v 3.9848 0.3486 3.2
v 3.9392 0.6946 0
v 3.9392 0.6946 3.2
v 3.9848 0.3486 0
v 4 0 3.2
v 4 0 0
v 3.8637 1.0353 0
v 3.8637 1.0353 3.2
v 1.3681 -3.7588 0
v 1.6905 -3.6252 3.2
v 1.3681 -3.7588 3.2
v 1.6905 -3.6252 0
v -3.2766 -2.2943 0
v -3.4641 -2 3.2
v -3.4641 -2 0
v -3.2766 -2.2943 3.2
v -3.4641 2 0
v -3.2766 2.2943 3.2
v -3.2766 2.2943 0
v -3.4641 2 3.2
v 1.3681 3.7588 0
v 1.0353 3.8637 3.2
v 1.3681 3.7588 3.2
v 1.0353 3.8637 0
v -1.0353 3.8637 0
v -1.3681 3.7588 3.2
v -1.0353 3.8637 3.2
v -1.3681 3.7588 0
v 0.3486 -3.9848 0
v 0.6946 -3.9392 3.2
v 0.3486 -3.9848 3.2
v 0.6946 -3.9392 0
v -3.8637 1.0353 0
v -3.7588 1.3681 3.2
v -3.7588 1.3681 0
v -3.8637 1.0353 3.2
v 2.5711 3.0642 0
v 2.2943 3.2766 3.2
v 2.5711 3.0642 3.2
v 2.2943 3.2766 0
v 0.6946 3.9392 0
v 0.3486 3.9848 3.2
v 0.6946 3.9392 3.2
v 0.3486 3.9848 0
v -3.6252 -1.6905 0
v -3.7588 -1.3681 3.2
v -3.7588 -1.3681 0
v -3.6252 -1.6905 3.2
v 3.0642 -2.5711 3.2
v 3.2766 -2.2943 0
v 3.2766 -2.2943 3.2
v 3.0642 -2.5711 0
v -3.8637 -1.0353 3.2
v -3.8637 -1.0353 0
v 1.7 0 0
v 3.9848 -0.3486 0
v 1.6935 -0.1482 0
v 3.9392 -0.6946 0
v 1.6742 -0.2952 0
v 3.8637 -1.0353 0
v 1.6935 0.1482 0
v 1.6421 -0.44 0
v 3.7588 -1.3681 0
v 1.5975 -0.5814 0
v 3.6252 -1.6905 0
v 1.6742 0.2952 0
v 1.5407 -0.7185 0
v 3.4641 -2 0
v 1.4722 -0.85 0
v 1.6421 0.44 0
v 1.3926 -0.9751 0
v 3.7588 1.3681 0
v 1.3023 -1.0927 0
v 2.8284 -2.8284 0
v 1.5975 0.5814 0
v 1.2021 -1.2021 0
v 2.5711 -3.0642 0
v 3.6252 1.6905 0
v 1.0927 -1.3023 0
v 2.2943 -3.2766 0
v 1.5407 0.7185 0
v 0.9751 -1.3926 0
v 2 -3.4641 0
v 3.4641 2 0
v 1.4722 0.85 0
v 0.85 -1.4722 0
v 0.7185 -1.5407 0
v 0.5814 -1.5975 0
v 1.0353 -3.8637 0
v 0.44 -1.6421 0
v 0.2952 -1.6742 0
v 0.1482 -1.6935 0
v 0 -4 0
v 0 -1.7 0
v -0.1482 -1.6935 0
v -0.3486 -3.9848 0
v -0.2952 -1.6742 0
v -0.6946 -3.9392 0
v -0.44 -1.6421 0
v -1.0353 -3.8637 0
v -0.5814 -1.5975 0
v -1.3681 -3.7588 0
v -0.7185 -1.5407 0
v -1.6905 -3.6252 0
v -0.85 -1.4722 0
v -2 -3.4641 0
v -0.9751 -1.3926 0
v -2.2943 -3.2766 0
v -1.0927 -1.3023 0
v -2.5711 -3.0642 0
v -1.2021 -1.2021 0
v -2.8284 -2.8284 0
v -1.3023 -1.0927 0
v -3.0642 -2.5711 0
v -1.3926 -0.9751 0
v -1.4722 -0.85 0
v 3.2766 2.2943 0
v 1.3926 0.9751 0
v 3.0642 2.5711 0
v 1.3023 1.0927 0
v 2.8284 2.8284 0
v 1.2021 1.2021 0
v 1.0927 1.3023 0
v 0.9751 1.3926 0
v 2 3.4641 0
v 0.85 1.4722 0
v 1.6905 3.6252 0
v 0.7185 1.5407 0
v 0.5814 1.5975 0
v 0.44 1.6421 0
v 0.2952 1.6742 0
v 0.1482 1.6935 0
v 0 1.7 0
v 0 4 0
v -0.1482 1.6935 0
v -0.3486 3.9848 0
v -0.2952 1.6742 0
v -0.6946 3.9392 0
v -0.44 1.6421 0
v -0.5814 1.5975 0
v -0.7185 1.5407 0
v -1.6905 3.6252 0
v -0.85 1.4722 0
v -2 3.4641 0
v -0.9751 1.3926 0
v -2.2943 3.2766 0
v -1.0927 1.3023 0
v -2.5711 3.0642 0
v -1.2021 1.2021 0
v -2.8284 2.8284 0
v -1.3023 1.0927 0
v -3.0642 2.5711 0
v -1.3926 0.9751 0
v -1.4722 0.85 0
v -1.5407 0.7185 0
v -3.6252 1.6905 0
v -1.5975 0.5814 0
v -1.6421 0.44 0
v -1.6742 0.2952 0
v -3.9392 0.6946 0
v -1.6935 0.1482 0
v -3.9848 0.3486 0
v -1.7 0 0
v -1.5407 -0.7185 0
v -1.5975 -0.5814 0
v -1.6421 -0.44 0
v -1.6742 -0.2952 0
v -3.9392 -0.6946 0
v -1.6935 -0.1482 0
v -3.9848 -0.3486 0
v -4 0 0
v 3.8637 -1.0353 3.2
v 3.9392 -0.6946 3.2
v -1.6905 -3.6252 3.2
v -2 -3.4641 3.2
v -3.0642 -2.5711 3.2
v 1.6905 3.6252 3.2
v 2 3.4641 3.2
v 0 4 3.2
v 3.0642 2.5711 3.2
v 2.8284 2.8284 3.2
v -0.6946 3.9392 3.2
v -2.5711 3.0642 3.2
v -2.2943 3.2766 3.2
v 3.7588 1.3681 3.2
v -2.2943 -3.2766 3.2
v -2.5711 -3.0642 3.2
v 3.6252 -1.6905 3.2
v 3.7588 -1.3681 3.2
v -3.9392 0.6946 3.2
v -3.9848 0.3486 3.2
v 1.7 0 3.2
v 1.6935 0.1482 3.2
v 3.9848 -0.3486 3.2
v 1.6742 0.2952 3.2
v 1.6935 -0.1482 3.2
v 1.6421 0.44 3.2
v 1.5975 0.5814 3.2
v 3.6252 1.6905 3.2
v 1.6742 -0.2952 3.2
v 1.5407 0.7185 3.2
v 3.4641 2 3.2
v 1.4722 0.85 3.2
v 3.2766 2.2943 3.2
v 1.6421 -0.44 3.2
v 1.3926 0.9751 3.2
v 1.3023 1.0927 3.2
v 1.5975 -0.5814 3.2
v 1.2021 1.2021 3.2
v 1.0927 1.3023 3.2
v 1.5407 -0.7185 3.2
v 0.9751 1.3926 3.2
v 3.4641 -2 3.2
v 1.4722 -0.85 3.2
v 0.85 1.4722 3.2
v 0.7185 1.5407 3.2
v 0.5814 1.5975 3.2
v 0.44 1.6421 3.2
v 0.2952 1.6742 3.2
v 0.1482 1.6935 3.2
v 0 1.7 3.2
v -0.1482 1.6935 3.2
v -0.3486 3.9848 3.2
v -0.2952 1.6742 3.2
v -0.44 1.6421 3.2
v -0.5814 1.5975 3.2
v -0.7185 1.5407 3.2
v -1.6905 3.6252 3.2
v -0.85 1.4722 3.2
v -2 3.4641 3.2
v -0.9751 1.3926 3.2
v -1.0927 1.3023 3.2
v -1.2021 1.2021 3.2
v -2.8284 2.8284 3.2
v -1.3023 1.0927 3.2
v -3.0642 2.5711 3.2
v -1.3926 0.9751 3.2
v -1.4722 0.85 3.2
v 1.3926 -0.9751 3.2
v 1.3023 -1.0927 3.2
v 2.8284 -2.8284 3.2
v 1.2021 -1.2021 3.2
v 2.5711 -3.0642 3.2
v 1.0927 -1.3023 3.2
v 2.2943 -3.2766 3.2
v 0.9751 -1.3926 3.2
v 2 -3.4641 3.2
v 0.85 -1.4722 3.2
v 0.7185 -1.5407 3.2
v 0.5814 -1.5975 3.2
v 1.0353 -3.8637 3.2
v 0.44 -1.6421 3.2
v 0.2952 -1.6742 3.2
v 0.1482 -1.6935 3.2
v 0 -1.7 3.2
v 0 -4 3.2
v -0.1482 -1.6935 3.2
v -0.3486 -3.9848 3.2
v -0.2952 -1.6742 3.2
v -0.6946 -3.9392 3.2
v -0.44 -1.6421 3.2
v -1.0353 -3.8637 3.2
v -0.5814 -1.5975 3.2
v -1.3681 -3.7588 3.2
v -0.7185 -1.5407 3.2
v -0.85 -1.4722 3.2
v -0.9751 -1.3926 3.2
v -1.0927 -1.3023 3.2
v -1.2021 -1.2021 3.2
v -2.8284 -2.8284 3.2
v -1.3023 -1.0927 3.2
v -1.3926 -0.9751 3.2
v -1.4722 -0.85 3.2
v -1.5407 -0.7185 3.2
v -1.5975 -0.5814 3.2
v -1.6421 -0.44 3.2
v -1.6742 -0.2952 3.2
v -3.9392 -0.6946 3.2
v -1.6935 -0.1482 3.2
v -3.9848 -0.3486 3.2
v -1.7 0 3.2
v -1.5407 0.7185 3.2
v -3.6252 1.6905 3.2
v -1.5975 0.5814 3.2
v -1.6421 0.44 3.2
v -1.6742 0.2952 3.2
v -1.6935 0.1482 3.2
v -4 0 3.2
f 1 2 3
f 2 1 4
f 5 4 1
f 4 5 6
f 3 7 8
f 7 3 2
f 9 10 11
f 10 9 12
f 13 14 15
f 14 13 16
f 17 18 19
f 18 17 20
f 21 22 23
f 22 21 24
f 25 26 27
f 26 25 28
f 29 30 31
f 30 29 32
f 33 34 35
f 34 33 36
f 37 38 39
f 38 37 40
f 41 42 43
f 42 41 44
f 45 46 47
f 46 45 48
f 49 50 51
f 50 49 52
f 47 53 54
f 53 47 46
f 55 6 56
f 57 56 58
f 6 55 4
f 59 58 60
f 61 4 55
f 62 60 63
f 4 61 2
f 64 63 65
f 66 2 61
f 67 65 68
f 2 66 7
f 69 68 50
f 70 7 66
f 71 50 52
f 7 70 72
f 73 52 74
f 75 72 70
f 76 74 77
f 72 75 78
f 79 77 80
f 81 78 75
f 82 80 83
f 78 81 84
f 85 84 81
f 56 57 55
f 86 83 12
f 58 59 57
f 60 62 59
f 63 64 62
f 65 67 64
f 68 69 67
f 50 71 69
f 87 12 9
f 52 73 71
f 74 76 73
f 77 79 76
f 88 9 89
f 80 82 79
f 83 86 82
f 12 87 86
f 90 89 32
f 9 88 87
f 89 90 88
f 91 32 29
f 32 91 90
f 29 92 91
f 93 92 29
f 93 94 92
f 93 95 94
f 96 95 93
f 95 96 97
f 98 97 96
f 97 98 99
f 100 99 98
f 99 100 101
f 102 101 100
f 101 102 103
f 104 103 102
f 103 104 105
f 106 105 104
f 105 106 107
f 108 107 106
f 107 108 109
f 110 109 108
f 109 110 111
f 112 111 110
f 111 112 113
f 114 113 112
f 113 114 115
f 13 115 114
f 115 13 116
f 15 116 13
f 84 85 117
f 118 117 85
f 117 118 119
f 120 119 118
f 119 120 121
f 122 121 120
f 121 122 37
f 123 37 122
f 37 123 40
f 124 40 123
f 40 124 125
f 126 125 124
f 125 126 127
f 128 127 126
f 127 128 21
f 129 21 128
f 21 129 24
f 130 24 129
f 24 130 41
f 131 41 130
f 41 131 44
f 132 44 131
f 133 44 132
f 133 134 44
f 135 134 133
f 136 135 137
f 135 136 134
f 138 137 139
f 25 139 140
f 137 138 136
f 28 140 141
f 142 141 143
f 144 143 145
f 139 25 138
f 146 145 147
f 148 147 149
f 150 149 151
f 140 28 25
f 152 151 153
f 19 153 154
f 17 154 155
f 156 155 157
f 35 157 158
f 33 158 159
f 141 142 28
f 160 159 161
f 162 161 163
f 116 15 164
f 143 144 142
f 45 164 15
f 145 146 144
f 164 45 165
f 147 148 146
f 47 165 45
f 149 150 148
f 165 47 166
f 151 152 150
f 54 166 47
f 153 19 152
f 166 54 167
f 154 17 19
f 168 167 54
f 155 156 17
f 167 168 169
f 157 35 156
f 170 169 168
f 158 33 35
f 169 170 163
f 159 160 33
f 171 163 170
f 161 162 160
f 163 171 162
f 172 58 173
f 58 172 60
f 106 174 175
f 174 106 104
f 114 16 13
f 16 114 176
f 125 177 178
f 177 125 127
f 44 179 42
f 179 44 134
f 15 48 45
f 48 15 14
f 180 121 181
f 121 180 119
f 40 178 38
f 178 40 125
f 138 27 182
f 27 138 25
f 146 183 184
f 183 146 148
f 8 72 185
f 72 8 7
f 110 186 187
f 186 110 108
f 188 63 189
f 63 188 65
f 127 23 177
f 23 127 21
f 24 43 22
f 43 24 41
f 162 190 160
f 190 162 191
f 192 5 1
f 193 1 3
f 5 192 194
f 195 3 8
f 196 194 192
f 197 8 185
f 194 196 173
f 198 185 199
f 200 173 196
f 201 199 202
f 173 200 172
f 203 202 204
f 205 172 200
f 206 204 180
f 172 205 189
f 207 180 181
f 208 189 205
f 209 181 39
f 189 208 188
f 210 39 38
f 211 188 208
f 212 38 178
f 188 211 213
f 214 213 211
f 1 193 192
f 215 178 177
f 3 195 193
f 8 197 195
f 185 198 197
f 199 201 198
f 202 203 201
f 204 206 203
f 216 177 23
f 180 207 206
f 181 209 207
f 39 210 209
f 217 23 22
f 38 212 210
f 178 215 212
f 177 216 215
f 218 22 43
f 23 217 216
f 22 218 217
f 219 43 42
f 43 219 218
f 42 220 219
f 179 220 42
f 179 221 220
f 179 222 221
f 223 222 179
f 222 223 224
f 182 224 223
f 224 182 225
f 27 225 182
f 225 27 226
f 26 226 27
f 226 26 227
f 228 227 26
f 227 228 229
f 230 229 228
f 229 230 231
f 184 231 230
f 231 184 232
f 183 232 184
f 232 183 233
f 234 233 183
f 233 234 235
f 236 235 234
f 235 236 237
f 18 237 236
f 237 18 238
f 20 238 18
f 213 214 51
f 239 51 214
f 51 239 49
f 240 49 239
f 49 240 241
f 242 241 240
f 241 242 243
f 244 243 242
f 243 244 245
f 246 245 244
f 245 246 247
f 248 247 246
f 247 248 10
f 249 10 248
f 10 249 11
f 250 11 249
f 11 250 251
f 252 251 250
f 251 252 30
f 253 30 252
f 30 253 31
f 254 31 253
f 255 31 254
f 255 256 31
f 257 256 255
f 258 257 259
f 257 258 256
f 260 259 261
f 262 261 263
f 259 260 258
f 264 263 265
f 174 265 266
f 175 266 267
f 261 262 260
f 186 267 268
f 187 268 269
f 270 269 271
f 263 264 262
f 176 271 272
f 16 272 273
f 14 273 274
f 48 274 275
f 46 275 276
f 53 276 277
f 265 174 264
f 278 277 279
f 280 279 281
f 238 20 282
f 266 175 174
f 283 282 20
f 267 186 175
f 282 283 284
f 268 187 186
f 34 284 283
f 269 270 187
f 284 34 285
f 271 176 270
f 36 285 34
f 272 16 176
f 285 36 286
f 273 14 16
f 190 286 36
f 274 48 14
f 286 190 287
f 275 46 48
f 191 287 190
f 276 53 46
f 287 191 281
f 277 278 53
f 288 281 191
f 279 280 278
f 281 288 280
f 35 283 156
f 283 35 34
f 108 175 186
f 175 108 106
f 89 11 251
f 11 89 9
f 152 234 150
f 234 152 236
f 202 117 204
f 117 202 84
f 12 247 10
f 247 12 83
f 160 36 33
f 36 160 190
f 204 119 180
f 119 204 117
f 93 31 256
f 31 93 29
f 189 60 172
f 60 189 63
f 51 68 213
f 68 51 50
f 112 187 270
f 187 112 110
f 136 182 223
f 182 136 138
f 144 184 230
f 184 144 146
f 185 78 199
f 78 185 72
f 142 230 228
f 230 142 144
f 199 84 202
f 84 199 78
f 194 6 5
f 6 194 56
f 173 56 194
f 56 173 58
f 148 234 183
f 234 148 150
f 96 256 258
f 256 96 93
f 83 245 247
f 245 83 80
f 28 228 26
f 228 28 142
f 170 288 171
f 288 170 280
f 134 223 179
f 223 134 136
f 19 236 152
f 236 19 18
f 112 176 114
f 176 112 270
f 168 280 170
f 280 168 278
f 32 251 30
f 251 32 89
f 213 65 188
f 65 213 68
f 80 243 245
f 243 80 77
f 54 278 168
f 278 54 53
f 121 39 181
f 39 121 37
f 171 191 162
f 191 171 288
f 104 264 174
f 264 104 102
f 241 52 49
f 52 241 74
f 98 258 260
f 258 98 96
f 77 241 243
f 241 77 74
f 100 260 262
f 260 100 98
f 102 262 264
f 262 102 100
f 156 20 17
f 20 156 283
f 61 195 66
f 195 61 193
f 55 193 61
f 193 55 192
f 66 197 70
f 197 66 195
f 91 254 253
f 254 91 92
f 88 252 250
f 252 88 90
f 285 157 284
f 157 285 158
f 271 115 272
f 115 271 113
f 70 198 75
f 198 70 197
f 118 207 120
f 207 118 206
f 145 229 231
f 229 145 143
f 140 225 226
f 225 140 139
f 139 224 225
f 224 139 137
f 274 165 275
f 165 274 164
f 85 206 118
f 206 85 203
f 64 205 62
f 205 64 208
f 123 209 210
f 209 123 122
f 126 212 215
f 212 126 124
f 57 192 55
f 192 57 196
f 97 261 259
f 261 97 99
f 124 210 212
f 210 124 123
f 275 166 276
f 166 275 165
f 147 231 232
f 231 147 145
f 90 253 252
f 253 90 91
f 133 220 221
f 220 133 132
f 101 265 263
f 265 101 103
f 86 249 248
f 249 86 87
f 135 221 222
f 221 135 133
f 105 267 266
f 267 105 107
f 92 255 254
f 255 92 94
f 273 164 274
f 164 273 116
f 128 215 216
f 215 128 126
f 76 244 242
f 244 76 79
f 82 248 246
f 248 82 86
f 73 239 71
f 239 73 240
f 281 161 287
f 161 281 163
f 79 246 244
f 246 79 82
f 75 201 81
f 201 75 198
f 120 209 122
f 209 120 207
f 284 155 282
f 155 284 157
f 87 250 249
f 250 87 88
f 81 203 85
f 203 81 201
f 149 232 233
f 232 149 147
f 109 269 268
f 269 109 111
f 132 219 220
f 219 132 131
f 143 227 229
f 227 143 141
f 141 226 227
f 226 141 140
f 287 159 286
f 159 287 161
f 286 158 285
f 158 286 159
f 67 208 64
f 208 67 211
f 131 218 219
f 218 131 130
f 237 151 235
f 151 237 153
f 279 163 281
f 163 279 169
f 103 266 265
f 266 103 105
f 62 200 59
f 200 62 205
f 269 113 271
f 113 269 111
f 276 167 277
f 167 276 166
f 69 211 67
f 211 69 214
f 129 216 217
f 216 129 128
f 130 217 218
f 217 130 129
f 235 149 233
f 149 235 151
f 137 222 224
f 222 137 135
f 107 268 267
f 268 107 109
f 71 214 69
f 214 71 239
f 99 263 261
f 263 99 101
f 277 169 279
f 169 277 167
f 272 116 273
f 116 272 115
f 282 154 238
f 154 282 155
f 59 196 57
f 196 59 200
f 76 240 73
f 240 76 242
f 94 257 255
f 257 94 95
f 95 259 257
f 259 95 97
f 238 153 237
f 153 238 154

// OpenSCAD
// file: ../lib/fdm.scad
// Shared FDM-friendly helpers for OpensCAD parts.
// Include from parts with: include <../lib/fdm.scad>;

// Default mesh density when a caller does not pass fragments=.
default_fragments = 48;
// Tiny overshoot used only inside helper boolean cleanup (not a part dimension).
helper_epsilon    = 0.01;

// Rounded rectangle extruded along Z (2D fillet → manifold solid).
module rounded_rect(size, radius, center = true) {
    w = size[0];
    h = size[1];
    r = min(radius, min(w, h) / 2);
    offset(r = r)
        offset(delta = -r)
            square([w, h], center = center);
}

module rounded_box(size, radius, center = true) {
    linear_extrude(height = size[2], center = center)
        rounded_rect([size[0], size[1]], radius, center = true);
}

// Cylinder with optional countersink (flat-head screw seat).
module countersunk_hole(d, h, cs_d = undef, cs_h = undef, center = false, fragments = undef) {
    fn = is_undef(fragments) ? default_fragments : fragments;
    cd = is_undef(cs_d) ? d * 2 : cs_d;
    ch = is_undef(cs_h) ? (cd - d) / 2 : cs_h;
    union() {
        cylinder(d = d, h = h, center = center, $fn = fn);
        translate([0, 0, center ? h / 2 - ch : h - ch])
            cylinder(d1 = d, d2 = cd, h = ch, center = false, $fn = fn);
    }
}

// Simple through-hole.
module mounting_hole(d, h, center = false, fragments = undef) {
    fn = is_undef(fragments) ? default_fragments : fragments;
    cylinder(d = d, h = h, center = center, $fn = fn);
}

// Fillet along +Z edge of a cube corner (positive volume).
// Prefer 2D offset fillets on extruded profiles for reliable manifolds.
module cylinder_fillet(r, h, fragments = undef) {
    fn = is_undef(fragments) ? default_fragments : fragments;
    eps = helper_epsilon;
    difference() {
        translate([-eps, -eps, 0])
            cube([r + eps, r + eps, h]);
        translate([r, r, -eps])
            cylinder(r = r, h = h + 2 * eps, $fn = fn);
    }
}
// main file
// Parametric spacer / washer for M2–M6 hardware.
// Customizer: Window → Customizer, tweak groups below, F5 to preview.

include <../lib/fdm.scad>;

/* [Geometry] */
inner_d  = 3.4;  // mm — clearance for M3 screw (loose fit)
outer_d  = 8.0;  // mm — requested outer diameter
height   = 3.2;  // mm — spacer thickness / standoff height
wall_min = 2.0;  // mm — enforced minimum radial wall

/* [Print] */
nozzle       = 0.4;  // mm — informational
fragments    = 72;   // [24:8:128] circle resolution ($fn)
bool_epsilon = 0.1;  // mm — through-cut overshoot for the bore

/* [Hidden] */
od  = max(outer_d, inner_d + 2 * wall_min);
$fn = fragments;

module spacer_washer() {
    difference() {
        cylinder(d = od, h = height, center = false);
        translate([0, 0, -bool_epsilon / 2])
            cylinder(d = inner_d, h = height + bool_epsilon, center = false);
    }
}

spacer_washer();
